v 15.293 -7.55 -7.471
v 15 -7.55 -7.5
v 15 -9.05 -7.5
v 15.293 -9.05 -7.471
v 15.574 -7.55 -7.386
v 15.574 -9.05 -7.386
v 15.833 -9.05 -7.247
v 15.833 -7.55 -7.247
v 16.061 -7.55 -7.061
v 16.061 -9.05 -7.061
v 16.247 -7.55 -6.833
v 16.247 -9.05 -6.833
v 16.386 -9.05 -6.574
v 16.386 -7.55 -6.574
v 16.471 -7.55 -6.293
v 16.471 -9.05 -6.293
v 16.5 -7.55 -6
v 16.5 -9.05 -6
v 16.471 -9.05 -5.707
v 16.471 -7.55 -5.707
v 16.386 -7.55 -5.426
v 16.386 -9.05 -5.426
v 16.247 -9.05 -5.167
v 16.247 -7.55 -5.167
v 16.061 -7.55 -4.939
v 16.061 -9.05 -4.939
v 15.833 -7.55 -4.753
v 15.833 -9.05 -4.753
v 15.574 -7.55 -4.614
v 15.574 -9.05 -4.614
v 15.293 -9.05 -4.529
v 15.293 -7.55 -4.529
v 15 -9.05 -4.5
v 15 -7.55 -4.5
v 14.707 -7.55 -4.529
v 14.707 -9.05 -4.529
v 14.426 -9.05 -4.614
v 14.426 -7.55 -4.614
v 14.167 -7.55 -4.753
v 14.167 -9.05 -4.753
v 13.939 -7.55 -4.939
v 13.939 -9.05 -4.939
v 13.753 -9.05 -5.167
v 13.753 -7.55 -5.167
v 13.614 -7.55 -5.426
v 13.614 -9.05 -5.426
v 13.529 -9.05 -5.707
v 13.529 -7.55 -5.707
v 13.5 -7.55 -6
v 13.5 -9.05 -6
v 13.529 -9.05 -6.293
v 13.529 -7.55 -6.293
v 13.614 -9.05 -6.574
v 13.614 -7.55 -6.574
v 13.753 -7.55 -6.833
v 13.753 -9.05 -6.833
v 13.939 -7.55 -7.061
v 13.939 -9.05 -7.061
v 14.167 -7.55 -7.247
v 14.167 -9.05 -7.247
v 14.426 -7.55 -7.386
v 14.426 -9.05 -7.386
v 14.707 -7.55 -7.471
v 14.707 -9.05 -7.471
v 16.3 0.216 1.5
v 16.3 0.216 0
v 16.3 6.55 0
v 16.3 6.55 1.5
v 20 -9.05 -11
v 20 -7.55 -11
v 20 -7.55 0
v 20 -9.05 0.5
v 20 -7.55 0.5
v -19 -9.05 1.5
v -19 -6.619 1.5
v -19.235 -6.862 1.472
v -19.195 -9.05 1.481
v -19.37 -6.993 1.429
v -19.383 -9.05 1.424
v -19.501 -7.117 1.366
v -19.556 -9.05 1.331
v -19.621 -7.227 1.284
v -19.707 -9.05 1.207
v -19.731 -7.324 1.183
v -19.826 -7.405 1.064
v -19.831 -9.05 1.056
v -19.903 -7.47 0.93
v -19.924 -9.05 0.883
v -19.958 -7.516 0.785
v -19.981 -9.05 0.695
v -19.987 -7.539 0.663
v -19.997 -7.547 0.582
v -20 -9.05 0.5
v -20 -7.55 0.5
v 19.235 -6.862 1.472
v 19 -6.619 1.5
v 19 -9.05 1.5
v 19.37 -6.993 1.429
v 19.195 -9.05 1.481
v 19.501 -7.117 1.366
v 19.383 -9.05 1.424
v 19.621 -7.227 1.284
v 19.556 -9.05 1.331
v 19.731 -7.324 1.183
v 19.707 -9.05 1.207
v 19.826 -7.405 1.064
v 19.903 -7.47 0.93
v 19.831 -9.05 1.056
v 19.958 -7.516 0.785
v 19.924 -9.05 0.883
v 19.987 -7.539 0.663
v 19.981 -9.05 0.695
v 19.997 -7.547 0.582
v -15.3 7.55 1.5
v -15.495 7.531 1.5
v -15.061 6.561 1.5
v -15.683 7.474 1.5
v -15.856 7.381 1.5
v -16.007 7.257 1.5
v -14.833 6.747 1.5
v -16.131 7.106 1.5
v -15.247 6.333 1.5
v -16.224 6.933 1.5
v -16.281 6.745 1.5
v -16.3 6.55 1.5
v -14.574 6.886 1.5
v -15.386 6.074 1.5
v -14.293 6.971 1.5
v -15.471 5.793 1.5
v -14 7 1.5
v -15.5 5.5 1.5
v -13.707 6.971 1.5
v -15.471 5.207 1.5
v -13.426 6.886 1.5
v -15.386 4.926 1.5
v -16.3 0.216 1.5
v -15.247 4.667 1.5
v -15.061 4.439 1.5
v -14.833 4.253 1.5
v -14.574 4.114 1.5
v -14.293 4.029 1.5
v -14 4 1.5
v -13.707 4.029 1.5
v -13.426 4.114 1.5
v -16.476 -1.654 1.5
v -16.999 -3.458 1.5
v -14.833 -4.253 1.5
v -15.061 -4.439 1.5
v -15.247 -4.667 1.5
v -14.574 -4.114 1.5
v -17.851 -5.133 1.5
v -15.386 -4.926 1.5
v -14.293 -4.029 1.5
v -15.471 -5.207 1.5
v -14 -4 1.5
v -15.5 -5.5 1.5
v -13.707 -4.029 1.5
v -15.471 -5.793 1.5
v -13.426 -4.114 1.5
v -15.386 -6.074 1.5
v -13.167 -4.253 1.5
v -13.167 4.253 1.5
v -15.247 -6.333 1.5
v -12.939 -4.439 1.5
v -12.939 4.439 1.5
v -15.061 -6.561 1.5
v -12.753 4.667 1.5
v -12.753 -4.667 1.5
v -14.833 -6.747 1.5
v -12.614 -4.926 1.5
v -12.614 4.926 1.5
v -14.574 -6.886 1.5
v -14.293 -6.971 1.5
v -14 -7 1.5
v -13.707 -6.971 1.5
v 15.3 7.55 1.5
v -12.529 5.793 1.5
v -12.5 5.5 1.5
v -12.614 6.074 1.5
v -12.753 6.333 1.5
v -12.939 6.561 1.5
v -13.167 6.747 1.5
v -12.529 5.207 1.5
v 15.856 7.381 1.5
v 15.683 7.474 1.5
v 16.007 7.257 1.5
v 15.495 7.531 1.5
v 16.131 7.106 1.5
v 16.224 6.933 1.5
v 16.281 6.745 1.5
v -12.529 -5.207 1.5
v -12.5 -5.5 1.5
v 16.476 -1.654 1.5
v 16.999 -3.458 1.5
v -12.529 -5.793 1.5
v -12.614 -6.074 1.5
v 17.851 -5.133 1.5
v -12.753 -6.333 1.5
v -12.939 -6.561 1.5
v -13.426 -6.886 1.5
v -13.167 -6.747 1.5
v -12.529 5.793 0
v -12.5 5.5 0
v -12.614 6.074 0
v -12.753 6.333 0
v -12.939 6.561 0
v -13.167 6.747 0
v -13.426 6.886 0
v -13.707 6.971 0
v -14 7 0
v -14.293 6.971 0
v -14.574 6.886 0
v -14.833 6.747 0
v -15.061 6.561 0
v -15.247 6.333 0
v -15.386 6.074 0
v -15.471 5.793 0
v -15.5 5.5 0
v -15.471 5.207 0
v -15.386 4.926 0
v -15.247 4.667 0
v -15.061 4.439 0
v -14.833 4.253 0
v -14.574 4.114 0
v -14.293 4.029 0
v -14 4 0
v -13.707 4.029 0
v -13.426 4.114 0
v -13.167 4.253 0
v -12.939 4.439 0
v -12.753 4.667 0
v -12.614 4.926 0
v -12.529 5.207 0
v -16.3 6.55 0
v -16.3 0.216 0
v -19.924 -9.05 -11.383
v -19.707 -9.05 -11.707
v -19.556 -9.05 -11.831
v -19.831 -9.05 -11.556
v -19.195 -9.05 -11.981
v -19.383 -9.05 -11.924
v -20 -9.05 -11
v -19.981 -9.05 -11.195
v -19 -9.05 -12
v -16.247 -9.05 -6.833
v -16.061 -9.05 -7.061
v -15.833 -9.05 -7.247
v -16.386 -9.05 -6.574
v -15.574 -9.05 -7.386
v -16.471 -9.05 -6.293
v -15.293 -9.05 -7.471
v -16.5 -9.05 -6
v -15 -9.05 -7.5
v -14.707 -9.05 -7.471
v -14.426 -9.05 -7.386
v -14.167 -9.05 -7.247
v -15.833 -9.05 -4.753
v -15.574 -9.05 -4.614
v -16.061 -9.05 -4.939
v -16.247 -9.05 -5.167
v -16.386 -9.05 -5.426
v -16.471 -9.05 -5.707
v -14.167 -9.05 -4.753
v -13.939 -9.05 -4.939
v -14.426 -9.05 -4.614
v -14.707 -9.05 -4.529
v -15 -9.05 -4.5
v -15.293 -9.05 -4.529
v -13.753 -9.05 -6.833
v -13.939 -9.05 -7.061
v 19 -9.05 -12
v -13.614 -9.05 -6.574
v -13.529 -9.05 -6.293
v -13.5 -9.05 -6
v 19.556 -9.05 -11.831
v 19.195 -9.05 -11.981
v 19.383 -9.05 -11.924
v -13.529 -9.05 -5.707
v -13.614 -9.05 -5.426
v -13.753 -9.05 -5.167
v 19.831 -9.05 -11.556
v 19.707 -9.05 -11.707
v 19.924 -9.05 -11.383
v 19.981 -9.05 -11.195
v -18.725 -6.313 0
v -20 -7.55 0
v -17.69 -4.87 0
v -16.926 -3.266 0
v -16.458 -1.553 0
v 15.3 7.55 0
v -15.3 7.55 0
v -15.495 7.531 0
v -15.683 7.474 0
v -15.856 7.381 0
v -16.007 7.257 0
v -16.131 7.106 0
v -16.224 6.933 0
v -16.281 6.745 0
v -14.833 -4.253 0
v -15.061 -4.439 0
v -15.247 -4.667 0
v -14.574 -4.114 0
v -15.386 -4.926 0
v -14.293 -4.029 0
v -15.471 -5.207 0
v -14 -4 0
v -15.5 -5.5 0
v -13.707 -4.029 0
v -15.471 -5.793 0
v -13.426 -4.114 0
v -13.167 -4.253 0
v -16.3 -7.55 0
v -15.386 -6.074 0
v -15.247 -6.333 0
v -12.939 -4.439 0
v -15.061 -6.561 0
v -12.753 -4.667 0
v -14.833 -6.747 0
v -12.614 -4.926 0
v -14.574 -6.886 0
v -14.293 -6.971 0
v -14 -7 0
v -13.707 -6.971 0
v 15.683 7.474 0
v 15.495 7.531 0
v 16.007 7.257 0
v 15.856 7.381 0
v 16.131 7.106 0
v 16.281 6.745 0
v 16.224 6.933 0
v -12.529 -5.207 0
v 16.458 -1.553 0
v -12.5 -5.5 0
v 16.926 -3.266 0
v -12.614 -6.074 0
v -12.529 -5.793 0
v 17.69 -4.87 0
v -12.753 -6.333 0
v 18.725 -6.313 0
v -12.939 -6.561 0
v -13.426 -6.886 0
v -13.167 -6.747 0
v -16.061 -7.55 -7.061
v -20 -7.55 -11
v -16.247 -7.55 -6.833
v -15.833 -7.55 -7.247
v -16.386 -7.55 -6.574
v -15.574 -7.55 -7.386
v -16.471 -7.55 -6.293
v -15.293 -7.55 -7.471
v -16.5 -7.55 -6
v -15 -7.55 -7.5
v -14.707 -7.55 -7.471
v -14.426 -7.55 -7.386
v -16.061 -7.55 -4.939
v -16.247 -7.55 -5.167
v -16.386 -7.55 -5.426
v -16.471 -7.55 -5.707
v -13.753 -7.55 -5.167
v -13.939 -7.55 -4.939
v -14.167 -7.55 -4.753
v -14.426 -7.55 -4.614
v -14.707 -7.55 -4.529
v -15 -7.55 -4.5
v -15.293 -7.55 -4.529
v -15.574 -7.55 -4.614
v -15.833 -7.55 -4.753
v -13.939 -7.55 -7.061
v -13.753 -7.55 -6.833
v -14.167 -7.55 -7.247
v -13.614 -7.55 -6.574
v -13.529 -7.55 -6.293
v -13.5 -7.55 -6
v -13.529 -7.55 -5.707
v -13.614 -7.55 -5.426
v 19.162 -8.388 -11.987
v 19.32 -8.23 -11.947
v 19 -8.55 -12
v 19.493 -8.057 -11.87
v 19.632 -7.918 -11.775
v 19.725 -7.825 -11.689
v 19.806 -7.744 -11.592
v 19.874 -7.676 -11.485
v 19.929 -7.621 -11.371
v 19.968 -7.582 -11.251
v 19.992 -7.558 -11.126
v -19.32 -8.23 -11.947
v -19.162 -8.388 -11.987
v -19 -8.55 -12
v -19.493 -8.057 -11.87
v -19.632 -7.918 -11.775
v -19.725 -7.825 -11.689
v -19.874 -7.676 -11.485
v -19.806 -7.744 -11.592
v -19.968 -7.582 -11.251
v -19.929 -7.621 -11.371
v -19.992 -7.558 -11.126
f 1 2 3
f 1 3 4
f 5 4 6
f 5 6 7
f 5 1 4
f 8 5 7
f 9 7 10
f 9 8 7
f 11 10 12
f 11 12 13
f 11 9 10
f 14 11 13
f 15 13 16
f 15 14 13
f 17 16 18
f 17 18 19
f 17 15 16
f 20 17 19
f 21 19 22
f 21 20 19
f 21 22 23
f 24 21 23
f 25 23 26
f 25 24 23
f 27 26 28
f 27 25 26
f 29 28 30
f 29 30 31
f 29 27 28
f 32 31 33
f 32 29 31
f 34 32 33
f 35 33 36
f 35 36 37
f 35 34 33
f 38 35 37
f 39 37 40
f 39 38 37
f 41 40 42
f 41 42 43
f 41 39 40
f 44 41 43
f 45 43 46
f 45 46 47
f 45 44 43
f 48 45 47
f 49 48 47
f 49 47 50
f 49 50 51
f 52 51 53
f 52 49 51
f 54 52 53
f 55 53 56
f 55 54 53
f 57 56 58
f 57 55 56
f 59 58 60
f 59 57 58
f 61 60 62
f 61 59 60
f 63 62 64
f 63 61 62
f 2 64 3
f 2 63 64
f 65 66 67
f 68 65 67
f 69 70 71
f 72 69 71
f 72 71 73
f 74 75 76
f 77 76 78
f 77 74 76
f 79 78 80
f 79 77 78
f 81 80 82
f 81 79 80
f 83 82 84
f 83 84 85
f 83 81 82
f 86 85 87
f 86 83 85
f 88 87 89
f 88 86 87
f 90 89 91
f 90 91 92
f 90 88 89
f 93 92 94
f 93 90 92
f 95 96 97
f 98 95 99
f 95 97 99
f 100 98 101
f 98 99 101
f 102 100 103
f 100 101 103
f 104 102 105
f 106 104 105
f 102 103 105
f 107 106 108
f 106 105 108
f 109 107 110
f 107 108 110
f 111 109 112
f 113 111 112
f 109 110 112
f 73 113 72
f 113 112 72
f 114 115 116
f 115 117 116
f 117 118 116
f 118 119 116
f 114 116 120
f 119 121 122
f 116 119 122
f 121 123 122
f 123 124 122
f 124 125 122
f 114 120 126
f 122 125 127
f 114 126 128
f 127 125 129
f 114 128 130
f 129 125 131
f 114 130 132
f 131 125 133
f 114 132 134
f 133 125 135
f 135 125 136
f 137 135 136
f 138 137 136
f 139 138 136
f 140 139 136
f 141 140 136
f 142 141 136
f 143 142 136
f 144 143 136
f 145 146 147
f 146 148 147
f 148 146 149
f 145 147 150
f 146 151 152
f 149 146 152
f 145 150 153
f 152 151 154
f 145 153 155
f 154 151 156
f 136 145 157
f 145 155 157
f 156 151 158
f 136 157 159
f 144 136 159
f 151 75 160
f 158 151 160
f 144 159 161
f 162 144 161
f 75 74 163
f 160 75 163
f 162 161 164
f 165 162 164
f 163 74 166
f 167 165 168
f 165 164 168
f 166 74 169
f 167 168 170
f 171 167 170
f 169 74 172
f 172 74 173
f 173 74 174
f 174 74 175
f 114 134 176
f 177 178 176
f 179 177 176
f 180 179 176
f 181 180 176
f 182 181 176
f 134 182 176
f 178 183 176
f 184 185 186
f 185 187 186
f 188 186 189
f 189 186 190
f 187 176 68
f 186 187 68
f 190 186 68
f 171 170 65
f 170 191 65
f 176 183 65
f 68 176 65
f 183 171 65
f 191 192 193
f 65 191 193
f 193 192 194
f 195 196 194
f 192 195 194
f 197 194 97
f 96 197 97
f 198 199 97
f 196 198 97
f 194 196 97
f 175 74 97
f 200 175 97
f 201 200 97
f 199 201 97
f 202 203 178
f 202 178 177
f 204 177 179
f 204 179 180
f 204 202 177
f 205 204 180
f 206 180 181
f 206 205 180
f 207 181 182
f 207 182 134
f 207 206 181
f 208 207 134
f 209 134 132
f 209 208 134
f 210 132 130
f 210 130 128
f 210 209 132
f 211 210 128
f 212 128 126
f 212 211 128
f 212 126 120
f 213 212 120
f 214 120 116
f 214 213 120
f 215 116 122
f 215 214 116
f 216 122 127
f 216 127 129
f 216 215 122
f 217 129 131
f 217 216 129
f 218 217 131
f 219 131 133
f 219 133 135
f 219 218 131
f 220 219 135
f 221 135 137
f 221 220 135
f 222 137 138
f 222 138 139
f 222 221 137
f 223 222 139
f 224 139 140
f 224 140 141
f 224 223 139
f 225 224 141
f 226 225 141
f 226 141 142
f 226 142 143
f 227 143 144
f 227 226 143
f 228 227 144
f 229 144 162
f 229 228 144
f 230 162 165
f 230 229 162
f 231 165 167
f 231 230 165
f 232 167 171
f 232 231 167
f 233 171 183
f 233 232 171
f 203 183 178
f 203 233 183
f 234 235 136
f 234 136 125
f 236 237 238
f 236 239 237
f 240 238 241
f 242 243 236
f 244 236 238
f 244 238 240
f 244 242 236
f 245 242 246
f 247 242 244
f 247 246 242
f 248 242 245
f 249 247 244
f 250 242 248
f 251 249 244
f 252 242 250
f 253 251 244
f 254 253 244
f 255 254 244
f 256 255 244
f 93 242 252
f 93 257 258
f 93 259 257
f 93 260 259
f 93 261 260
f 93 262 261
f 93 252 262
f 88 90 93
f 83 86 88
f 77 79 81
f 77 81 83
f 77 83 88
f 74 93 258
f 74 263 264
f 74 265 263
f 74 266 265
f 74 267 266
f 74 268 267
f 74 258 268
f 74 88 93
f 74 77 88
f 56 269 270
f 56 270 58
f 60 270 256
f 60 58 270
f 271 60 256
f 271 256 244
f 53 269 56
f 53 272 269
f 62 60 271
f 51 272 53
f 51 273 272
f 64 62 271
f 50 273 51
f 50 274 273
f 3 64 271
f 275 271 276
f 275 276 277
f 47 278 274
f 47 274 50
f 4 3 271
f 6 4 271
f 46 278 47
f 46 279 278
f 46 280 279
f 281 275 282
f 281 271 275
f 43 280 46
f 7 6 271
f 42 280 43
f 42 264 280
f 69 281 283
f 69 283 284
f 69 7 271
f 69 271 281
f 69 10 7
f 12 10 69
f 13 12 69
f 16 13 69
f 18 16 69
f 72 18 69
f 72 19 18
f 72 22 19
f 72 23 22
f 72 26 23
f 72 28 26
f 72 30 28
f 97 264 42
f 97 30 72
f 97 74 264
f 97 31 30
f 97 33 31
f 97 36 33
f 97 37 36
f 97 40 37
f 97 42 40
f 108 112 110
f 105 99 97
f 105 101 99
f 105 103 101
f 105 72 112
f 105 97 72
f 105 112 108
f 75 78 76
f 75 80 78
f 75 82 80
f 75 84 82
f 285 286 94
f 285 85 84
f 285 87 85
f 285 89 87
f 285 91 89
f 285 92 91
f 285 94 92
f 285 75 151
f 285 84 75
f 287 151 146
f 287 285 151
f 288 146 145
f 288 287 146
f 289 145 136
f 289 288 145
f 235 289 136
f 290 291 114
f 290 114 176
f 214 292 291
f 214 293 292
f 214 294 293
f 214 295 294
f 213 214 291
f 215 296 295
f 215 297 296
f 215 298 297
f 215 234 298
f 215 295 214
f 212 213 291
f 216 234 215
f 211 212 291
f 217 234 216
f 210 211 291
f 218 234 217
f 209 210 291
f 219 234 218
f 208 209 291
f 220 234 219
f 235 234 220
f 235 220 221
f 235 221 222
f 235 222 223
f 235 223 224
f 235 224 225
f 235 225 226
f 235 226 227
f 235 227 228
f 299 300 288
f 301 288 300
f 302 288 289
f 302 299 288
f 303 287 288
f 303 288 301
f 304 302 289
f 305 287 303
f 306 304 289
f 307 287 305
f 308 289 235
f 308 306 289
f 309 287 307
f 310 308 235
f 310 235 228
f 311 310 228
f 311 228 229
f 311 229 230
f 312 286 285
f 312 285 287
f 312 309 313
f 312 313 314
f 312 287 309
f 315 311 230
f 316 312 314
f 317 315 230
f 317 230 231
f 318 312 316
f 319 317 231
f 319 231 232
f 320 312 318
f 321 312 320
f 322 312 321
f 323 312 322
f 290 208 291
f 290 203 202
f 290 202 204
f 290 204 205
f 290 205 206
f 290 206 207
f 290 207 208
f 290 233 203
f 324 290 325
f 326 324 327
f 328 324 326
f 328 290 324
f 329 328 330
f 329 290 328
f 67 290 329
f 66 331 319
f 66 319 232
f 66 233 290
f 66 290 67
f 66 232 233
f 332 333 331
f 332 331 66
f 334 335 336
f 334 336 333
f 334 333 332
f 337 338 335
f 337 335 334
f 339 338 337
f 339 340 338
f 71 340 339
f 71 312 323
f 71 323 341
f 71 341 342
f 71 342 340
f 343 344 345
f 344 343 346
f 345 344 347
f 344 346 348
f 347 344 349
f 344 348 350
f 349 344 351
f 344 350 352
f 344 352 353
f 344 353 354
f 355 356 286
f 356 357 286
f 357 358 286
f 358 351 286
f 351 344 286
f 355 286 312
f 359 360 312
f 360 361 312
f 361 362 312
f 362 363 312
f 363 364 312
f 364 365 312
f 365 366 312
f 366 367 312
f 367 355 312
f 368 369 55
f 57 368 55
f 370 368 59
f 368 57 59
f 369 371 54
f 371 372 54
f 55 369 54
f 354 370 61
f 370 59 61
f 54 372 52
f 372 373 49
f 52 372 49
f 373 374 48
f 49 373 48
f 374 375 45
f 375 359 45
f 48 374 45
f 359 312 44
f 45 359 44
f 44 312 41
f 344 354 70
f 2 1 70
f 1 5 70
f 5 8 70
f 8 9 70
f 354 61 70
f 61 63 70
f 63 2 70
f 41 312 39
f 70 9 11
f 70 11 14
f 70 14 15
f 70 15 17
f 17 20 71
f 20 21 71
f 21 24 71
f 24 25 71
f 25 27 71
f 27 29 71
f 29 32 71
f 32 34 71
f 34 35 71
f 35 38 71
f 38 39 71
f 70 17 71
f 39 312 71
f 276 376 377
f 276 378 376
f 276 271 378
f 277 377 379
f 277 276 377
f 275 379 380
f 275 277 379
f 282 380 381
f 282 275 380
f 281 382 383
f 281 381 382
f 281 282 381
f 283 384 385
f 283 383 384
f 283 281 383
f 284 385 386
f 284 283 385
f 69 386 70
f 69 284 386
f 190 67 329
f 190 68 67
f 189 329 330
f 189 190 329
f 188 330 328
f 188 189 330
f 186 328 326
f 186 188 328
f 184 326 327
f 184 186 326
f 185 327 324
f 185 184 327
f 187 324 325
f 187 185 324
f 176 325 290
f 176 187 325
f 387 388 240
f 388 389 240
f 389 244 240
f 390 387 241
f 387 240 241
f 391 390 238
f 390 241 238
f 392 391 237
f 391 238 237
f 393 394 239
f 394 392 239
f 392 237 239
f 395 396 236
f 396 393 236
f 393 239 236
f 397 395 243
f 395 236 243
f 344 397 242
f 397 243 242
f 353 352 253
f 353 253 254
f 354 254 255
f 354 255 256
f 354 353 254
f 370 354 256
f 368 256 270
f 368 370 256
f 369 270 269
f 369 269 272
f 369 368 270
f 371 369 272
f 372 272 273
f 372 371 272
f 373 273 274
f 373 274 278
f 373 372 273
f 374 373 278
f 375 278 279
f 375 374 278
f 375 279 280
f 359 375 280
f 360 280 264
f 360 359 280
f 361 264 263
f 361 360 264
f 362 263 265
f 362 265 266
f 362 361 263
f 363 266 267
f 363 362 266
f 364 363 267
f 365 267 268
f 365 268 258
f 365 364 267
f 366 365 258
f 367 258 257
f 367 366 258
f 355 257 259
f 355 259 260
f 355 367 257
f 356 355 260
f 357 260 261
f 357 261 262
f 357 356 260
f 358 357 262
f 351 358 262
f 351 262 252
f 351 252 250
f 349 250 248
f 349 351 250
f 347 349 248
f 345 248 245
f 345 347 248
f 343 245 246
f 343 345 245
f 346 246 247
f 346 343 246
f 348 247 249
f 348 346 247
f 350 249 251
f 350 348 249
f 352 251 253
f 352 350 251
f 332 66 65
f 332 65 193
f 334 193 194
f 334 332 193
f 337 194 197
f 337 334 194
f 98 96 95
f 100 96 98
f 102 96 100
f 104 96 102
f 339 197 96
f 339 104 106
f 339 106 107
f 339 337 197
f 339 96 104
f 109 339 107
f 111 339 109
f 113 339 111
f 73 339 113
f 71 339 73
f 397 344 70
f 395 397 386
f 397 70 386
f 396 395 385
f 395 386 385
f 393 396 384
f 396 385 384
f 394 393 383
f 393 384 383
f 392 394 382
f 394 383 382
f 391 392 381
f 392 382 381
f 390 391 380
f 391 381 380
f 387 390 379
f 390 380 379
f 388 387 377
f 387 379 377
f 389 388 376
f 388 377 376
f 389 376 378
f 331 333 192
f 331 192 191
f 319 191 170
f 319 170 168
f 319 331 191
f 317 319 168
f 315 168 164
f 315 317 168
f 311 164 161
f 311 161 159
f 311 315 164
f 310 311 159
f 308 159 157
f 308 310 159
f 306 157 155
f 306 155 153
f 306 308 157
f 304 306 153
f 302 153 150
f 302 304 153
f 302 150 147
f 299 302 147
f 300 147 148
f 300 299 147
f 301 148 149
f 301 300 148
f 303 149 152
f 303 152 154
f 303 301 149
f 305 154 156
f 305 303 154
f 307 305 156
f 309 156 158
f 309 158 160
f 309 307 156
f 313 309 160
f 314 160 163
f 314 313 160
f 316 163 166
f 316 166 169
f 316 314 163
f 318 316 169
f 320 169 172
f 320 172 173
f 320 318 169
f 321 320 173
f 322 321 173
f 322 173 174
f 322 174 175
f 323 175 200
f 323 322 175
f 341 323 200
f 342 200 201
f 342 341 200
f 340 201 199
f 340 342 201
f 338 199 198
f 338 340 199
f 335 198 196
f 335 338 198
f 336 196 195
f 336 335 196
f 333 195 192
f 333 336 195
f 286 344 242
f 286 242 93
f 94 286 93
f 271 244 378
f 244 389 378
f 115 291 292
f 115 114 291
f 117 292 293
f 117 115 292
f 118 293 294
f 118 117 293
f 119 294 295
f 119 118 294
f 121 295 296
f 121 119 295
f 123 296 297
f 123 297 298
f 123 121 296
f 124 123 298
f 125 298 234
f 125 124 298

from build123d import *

# Parameters (mm, degrees)
SKETCH1_W           = 32.6
SKETCH1_H           = 15.1
SKETCH1_R           = 1.5
BOSS_EXTRUDE1_DEPTH = 1.5
SKETCH2_W           = 40
SKETCH2_H           = 13.5
SKETCH2_R           = 1.5
BOSS_EXTRUDE2_DEPTH = 1.5
FILLET1_R           = 10
FILLET2_R           = 1


with BuildPart() as part:
    # Sketch1 → Boss-Extrude1 (new body)
    with BuildSketch(Plane.XY):
        Rectangle(SKETCH1_W, SKETCH1_H)
        with Locations((-14, 5.5)):
            Circle(SKETCH1_R, mode=Mode.SUBTRACT)
        with Locations((-14, -5.5)):
            Circle(SKETCH1_R, mode=Mode.SUBTRACT)
    extrude(amount=BOSS_EXTRUDE1_DEPTH)

    # Sketch2 → Boss-Extrude2 (add)
    with BuildSketch(Plane.XZ.offset(7.55)):
        with Locations((0, -5.25)):
            Rectangle(SKETCH2_W, SKETCH2_H)
        with Locations(Location((-15, -6, 0), (0, 0, 270))):
            Circle(SKETCH2_R, mode=Mode.SUBTRACT)
        with Locations(Location((15, -6, 0), (0, 0, 270))):
            Circle(SKETCH2_R, mode=Mode.SUBTRACT)
    extrude(amount=BOSS_EXTRUDE2_DEPTH)

    # Fillet1
    # the kernel refuses this fillet: 10 mm, written as the material it adds along each edge
    with BuildSketch(Plane(origin=(16.3, -7.55, 0), x_dir=(1, 0, 0), z_dir=(0, 0, 1))) as fillet1_piece_1:
        with BuildLine():
            CenterArc((10, 7.765951326), FILLET1_R, 180, 50.949877464)
            Line((0, 7.765951326), (-0.2, 7.765951326))
            Line((-0.2, 7.765951326), (-0.2, 0))
            Line((-0.2, 0), (0, -0.2))
            ThreePointArc((0, -0.2), (1.85, -0.2), (3.574, -0.155319027))
            Line((3.574, -0.155319027), (3.7, 0))
        make_face()
    extrude(amount=1.5)
    with BuildSketch(Plane(origin=(-16.3, -7.55, 0), x_dir=(-1, 0, 0), z_dir=(0, 0, 1))) as fillet1_piece_2:
        with BuildLine():
            CenterArc((10, -7.765951326), FILLET1_R, 129.050122536, 50.949877464)
            Line((0, -7.765951326), (-0.2, -7.765951326))
            Line((-0.2, -7.765951326), (-0.2, 0))
            Line((-0.2, 0), (0, 0.2))
            ThreePointArc((0, 0.2), (1.85, 0.2), (3.574, 0.155319027))
            Line((3.574, 0.155319027), (3.7, 0))
        make_face()
    extrude(amount=1.5)

    # Fillet2
    fillet2_edges = [part.edges().sort_by_distance(p)[0] for p in [
        (-20, -8.3, 1.5),
        (0, -7.55, -12),
        (-20, -8.3, -12),
        (20, -8.3, -12),
        (20, -8.3, 1.5),
        (-16.3, 7.55, 0.75),
        (16.3, 7.55, 0.75),
    ]]
    fillet(fillet2_edges, radius=FILLET2_R)


solid = part.part
